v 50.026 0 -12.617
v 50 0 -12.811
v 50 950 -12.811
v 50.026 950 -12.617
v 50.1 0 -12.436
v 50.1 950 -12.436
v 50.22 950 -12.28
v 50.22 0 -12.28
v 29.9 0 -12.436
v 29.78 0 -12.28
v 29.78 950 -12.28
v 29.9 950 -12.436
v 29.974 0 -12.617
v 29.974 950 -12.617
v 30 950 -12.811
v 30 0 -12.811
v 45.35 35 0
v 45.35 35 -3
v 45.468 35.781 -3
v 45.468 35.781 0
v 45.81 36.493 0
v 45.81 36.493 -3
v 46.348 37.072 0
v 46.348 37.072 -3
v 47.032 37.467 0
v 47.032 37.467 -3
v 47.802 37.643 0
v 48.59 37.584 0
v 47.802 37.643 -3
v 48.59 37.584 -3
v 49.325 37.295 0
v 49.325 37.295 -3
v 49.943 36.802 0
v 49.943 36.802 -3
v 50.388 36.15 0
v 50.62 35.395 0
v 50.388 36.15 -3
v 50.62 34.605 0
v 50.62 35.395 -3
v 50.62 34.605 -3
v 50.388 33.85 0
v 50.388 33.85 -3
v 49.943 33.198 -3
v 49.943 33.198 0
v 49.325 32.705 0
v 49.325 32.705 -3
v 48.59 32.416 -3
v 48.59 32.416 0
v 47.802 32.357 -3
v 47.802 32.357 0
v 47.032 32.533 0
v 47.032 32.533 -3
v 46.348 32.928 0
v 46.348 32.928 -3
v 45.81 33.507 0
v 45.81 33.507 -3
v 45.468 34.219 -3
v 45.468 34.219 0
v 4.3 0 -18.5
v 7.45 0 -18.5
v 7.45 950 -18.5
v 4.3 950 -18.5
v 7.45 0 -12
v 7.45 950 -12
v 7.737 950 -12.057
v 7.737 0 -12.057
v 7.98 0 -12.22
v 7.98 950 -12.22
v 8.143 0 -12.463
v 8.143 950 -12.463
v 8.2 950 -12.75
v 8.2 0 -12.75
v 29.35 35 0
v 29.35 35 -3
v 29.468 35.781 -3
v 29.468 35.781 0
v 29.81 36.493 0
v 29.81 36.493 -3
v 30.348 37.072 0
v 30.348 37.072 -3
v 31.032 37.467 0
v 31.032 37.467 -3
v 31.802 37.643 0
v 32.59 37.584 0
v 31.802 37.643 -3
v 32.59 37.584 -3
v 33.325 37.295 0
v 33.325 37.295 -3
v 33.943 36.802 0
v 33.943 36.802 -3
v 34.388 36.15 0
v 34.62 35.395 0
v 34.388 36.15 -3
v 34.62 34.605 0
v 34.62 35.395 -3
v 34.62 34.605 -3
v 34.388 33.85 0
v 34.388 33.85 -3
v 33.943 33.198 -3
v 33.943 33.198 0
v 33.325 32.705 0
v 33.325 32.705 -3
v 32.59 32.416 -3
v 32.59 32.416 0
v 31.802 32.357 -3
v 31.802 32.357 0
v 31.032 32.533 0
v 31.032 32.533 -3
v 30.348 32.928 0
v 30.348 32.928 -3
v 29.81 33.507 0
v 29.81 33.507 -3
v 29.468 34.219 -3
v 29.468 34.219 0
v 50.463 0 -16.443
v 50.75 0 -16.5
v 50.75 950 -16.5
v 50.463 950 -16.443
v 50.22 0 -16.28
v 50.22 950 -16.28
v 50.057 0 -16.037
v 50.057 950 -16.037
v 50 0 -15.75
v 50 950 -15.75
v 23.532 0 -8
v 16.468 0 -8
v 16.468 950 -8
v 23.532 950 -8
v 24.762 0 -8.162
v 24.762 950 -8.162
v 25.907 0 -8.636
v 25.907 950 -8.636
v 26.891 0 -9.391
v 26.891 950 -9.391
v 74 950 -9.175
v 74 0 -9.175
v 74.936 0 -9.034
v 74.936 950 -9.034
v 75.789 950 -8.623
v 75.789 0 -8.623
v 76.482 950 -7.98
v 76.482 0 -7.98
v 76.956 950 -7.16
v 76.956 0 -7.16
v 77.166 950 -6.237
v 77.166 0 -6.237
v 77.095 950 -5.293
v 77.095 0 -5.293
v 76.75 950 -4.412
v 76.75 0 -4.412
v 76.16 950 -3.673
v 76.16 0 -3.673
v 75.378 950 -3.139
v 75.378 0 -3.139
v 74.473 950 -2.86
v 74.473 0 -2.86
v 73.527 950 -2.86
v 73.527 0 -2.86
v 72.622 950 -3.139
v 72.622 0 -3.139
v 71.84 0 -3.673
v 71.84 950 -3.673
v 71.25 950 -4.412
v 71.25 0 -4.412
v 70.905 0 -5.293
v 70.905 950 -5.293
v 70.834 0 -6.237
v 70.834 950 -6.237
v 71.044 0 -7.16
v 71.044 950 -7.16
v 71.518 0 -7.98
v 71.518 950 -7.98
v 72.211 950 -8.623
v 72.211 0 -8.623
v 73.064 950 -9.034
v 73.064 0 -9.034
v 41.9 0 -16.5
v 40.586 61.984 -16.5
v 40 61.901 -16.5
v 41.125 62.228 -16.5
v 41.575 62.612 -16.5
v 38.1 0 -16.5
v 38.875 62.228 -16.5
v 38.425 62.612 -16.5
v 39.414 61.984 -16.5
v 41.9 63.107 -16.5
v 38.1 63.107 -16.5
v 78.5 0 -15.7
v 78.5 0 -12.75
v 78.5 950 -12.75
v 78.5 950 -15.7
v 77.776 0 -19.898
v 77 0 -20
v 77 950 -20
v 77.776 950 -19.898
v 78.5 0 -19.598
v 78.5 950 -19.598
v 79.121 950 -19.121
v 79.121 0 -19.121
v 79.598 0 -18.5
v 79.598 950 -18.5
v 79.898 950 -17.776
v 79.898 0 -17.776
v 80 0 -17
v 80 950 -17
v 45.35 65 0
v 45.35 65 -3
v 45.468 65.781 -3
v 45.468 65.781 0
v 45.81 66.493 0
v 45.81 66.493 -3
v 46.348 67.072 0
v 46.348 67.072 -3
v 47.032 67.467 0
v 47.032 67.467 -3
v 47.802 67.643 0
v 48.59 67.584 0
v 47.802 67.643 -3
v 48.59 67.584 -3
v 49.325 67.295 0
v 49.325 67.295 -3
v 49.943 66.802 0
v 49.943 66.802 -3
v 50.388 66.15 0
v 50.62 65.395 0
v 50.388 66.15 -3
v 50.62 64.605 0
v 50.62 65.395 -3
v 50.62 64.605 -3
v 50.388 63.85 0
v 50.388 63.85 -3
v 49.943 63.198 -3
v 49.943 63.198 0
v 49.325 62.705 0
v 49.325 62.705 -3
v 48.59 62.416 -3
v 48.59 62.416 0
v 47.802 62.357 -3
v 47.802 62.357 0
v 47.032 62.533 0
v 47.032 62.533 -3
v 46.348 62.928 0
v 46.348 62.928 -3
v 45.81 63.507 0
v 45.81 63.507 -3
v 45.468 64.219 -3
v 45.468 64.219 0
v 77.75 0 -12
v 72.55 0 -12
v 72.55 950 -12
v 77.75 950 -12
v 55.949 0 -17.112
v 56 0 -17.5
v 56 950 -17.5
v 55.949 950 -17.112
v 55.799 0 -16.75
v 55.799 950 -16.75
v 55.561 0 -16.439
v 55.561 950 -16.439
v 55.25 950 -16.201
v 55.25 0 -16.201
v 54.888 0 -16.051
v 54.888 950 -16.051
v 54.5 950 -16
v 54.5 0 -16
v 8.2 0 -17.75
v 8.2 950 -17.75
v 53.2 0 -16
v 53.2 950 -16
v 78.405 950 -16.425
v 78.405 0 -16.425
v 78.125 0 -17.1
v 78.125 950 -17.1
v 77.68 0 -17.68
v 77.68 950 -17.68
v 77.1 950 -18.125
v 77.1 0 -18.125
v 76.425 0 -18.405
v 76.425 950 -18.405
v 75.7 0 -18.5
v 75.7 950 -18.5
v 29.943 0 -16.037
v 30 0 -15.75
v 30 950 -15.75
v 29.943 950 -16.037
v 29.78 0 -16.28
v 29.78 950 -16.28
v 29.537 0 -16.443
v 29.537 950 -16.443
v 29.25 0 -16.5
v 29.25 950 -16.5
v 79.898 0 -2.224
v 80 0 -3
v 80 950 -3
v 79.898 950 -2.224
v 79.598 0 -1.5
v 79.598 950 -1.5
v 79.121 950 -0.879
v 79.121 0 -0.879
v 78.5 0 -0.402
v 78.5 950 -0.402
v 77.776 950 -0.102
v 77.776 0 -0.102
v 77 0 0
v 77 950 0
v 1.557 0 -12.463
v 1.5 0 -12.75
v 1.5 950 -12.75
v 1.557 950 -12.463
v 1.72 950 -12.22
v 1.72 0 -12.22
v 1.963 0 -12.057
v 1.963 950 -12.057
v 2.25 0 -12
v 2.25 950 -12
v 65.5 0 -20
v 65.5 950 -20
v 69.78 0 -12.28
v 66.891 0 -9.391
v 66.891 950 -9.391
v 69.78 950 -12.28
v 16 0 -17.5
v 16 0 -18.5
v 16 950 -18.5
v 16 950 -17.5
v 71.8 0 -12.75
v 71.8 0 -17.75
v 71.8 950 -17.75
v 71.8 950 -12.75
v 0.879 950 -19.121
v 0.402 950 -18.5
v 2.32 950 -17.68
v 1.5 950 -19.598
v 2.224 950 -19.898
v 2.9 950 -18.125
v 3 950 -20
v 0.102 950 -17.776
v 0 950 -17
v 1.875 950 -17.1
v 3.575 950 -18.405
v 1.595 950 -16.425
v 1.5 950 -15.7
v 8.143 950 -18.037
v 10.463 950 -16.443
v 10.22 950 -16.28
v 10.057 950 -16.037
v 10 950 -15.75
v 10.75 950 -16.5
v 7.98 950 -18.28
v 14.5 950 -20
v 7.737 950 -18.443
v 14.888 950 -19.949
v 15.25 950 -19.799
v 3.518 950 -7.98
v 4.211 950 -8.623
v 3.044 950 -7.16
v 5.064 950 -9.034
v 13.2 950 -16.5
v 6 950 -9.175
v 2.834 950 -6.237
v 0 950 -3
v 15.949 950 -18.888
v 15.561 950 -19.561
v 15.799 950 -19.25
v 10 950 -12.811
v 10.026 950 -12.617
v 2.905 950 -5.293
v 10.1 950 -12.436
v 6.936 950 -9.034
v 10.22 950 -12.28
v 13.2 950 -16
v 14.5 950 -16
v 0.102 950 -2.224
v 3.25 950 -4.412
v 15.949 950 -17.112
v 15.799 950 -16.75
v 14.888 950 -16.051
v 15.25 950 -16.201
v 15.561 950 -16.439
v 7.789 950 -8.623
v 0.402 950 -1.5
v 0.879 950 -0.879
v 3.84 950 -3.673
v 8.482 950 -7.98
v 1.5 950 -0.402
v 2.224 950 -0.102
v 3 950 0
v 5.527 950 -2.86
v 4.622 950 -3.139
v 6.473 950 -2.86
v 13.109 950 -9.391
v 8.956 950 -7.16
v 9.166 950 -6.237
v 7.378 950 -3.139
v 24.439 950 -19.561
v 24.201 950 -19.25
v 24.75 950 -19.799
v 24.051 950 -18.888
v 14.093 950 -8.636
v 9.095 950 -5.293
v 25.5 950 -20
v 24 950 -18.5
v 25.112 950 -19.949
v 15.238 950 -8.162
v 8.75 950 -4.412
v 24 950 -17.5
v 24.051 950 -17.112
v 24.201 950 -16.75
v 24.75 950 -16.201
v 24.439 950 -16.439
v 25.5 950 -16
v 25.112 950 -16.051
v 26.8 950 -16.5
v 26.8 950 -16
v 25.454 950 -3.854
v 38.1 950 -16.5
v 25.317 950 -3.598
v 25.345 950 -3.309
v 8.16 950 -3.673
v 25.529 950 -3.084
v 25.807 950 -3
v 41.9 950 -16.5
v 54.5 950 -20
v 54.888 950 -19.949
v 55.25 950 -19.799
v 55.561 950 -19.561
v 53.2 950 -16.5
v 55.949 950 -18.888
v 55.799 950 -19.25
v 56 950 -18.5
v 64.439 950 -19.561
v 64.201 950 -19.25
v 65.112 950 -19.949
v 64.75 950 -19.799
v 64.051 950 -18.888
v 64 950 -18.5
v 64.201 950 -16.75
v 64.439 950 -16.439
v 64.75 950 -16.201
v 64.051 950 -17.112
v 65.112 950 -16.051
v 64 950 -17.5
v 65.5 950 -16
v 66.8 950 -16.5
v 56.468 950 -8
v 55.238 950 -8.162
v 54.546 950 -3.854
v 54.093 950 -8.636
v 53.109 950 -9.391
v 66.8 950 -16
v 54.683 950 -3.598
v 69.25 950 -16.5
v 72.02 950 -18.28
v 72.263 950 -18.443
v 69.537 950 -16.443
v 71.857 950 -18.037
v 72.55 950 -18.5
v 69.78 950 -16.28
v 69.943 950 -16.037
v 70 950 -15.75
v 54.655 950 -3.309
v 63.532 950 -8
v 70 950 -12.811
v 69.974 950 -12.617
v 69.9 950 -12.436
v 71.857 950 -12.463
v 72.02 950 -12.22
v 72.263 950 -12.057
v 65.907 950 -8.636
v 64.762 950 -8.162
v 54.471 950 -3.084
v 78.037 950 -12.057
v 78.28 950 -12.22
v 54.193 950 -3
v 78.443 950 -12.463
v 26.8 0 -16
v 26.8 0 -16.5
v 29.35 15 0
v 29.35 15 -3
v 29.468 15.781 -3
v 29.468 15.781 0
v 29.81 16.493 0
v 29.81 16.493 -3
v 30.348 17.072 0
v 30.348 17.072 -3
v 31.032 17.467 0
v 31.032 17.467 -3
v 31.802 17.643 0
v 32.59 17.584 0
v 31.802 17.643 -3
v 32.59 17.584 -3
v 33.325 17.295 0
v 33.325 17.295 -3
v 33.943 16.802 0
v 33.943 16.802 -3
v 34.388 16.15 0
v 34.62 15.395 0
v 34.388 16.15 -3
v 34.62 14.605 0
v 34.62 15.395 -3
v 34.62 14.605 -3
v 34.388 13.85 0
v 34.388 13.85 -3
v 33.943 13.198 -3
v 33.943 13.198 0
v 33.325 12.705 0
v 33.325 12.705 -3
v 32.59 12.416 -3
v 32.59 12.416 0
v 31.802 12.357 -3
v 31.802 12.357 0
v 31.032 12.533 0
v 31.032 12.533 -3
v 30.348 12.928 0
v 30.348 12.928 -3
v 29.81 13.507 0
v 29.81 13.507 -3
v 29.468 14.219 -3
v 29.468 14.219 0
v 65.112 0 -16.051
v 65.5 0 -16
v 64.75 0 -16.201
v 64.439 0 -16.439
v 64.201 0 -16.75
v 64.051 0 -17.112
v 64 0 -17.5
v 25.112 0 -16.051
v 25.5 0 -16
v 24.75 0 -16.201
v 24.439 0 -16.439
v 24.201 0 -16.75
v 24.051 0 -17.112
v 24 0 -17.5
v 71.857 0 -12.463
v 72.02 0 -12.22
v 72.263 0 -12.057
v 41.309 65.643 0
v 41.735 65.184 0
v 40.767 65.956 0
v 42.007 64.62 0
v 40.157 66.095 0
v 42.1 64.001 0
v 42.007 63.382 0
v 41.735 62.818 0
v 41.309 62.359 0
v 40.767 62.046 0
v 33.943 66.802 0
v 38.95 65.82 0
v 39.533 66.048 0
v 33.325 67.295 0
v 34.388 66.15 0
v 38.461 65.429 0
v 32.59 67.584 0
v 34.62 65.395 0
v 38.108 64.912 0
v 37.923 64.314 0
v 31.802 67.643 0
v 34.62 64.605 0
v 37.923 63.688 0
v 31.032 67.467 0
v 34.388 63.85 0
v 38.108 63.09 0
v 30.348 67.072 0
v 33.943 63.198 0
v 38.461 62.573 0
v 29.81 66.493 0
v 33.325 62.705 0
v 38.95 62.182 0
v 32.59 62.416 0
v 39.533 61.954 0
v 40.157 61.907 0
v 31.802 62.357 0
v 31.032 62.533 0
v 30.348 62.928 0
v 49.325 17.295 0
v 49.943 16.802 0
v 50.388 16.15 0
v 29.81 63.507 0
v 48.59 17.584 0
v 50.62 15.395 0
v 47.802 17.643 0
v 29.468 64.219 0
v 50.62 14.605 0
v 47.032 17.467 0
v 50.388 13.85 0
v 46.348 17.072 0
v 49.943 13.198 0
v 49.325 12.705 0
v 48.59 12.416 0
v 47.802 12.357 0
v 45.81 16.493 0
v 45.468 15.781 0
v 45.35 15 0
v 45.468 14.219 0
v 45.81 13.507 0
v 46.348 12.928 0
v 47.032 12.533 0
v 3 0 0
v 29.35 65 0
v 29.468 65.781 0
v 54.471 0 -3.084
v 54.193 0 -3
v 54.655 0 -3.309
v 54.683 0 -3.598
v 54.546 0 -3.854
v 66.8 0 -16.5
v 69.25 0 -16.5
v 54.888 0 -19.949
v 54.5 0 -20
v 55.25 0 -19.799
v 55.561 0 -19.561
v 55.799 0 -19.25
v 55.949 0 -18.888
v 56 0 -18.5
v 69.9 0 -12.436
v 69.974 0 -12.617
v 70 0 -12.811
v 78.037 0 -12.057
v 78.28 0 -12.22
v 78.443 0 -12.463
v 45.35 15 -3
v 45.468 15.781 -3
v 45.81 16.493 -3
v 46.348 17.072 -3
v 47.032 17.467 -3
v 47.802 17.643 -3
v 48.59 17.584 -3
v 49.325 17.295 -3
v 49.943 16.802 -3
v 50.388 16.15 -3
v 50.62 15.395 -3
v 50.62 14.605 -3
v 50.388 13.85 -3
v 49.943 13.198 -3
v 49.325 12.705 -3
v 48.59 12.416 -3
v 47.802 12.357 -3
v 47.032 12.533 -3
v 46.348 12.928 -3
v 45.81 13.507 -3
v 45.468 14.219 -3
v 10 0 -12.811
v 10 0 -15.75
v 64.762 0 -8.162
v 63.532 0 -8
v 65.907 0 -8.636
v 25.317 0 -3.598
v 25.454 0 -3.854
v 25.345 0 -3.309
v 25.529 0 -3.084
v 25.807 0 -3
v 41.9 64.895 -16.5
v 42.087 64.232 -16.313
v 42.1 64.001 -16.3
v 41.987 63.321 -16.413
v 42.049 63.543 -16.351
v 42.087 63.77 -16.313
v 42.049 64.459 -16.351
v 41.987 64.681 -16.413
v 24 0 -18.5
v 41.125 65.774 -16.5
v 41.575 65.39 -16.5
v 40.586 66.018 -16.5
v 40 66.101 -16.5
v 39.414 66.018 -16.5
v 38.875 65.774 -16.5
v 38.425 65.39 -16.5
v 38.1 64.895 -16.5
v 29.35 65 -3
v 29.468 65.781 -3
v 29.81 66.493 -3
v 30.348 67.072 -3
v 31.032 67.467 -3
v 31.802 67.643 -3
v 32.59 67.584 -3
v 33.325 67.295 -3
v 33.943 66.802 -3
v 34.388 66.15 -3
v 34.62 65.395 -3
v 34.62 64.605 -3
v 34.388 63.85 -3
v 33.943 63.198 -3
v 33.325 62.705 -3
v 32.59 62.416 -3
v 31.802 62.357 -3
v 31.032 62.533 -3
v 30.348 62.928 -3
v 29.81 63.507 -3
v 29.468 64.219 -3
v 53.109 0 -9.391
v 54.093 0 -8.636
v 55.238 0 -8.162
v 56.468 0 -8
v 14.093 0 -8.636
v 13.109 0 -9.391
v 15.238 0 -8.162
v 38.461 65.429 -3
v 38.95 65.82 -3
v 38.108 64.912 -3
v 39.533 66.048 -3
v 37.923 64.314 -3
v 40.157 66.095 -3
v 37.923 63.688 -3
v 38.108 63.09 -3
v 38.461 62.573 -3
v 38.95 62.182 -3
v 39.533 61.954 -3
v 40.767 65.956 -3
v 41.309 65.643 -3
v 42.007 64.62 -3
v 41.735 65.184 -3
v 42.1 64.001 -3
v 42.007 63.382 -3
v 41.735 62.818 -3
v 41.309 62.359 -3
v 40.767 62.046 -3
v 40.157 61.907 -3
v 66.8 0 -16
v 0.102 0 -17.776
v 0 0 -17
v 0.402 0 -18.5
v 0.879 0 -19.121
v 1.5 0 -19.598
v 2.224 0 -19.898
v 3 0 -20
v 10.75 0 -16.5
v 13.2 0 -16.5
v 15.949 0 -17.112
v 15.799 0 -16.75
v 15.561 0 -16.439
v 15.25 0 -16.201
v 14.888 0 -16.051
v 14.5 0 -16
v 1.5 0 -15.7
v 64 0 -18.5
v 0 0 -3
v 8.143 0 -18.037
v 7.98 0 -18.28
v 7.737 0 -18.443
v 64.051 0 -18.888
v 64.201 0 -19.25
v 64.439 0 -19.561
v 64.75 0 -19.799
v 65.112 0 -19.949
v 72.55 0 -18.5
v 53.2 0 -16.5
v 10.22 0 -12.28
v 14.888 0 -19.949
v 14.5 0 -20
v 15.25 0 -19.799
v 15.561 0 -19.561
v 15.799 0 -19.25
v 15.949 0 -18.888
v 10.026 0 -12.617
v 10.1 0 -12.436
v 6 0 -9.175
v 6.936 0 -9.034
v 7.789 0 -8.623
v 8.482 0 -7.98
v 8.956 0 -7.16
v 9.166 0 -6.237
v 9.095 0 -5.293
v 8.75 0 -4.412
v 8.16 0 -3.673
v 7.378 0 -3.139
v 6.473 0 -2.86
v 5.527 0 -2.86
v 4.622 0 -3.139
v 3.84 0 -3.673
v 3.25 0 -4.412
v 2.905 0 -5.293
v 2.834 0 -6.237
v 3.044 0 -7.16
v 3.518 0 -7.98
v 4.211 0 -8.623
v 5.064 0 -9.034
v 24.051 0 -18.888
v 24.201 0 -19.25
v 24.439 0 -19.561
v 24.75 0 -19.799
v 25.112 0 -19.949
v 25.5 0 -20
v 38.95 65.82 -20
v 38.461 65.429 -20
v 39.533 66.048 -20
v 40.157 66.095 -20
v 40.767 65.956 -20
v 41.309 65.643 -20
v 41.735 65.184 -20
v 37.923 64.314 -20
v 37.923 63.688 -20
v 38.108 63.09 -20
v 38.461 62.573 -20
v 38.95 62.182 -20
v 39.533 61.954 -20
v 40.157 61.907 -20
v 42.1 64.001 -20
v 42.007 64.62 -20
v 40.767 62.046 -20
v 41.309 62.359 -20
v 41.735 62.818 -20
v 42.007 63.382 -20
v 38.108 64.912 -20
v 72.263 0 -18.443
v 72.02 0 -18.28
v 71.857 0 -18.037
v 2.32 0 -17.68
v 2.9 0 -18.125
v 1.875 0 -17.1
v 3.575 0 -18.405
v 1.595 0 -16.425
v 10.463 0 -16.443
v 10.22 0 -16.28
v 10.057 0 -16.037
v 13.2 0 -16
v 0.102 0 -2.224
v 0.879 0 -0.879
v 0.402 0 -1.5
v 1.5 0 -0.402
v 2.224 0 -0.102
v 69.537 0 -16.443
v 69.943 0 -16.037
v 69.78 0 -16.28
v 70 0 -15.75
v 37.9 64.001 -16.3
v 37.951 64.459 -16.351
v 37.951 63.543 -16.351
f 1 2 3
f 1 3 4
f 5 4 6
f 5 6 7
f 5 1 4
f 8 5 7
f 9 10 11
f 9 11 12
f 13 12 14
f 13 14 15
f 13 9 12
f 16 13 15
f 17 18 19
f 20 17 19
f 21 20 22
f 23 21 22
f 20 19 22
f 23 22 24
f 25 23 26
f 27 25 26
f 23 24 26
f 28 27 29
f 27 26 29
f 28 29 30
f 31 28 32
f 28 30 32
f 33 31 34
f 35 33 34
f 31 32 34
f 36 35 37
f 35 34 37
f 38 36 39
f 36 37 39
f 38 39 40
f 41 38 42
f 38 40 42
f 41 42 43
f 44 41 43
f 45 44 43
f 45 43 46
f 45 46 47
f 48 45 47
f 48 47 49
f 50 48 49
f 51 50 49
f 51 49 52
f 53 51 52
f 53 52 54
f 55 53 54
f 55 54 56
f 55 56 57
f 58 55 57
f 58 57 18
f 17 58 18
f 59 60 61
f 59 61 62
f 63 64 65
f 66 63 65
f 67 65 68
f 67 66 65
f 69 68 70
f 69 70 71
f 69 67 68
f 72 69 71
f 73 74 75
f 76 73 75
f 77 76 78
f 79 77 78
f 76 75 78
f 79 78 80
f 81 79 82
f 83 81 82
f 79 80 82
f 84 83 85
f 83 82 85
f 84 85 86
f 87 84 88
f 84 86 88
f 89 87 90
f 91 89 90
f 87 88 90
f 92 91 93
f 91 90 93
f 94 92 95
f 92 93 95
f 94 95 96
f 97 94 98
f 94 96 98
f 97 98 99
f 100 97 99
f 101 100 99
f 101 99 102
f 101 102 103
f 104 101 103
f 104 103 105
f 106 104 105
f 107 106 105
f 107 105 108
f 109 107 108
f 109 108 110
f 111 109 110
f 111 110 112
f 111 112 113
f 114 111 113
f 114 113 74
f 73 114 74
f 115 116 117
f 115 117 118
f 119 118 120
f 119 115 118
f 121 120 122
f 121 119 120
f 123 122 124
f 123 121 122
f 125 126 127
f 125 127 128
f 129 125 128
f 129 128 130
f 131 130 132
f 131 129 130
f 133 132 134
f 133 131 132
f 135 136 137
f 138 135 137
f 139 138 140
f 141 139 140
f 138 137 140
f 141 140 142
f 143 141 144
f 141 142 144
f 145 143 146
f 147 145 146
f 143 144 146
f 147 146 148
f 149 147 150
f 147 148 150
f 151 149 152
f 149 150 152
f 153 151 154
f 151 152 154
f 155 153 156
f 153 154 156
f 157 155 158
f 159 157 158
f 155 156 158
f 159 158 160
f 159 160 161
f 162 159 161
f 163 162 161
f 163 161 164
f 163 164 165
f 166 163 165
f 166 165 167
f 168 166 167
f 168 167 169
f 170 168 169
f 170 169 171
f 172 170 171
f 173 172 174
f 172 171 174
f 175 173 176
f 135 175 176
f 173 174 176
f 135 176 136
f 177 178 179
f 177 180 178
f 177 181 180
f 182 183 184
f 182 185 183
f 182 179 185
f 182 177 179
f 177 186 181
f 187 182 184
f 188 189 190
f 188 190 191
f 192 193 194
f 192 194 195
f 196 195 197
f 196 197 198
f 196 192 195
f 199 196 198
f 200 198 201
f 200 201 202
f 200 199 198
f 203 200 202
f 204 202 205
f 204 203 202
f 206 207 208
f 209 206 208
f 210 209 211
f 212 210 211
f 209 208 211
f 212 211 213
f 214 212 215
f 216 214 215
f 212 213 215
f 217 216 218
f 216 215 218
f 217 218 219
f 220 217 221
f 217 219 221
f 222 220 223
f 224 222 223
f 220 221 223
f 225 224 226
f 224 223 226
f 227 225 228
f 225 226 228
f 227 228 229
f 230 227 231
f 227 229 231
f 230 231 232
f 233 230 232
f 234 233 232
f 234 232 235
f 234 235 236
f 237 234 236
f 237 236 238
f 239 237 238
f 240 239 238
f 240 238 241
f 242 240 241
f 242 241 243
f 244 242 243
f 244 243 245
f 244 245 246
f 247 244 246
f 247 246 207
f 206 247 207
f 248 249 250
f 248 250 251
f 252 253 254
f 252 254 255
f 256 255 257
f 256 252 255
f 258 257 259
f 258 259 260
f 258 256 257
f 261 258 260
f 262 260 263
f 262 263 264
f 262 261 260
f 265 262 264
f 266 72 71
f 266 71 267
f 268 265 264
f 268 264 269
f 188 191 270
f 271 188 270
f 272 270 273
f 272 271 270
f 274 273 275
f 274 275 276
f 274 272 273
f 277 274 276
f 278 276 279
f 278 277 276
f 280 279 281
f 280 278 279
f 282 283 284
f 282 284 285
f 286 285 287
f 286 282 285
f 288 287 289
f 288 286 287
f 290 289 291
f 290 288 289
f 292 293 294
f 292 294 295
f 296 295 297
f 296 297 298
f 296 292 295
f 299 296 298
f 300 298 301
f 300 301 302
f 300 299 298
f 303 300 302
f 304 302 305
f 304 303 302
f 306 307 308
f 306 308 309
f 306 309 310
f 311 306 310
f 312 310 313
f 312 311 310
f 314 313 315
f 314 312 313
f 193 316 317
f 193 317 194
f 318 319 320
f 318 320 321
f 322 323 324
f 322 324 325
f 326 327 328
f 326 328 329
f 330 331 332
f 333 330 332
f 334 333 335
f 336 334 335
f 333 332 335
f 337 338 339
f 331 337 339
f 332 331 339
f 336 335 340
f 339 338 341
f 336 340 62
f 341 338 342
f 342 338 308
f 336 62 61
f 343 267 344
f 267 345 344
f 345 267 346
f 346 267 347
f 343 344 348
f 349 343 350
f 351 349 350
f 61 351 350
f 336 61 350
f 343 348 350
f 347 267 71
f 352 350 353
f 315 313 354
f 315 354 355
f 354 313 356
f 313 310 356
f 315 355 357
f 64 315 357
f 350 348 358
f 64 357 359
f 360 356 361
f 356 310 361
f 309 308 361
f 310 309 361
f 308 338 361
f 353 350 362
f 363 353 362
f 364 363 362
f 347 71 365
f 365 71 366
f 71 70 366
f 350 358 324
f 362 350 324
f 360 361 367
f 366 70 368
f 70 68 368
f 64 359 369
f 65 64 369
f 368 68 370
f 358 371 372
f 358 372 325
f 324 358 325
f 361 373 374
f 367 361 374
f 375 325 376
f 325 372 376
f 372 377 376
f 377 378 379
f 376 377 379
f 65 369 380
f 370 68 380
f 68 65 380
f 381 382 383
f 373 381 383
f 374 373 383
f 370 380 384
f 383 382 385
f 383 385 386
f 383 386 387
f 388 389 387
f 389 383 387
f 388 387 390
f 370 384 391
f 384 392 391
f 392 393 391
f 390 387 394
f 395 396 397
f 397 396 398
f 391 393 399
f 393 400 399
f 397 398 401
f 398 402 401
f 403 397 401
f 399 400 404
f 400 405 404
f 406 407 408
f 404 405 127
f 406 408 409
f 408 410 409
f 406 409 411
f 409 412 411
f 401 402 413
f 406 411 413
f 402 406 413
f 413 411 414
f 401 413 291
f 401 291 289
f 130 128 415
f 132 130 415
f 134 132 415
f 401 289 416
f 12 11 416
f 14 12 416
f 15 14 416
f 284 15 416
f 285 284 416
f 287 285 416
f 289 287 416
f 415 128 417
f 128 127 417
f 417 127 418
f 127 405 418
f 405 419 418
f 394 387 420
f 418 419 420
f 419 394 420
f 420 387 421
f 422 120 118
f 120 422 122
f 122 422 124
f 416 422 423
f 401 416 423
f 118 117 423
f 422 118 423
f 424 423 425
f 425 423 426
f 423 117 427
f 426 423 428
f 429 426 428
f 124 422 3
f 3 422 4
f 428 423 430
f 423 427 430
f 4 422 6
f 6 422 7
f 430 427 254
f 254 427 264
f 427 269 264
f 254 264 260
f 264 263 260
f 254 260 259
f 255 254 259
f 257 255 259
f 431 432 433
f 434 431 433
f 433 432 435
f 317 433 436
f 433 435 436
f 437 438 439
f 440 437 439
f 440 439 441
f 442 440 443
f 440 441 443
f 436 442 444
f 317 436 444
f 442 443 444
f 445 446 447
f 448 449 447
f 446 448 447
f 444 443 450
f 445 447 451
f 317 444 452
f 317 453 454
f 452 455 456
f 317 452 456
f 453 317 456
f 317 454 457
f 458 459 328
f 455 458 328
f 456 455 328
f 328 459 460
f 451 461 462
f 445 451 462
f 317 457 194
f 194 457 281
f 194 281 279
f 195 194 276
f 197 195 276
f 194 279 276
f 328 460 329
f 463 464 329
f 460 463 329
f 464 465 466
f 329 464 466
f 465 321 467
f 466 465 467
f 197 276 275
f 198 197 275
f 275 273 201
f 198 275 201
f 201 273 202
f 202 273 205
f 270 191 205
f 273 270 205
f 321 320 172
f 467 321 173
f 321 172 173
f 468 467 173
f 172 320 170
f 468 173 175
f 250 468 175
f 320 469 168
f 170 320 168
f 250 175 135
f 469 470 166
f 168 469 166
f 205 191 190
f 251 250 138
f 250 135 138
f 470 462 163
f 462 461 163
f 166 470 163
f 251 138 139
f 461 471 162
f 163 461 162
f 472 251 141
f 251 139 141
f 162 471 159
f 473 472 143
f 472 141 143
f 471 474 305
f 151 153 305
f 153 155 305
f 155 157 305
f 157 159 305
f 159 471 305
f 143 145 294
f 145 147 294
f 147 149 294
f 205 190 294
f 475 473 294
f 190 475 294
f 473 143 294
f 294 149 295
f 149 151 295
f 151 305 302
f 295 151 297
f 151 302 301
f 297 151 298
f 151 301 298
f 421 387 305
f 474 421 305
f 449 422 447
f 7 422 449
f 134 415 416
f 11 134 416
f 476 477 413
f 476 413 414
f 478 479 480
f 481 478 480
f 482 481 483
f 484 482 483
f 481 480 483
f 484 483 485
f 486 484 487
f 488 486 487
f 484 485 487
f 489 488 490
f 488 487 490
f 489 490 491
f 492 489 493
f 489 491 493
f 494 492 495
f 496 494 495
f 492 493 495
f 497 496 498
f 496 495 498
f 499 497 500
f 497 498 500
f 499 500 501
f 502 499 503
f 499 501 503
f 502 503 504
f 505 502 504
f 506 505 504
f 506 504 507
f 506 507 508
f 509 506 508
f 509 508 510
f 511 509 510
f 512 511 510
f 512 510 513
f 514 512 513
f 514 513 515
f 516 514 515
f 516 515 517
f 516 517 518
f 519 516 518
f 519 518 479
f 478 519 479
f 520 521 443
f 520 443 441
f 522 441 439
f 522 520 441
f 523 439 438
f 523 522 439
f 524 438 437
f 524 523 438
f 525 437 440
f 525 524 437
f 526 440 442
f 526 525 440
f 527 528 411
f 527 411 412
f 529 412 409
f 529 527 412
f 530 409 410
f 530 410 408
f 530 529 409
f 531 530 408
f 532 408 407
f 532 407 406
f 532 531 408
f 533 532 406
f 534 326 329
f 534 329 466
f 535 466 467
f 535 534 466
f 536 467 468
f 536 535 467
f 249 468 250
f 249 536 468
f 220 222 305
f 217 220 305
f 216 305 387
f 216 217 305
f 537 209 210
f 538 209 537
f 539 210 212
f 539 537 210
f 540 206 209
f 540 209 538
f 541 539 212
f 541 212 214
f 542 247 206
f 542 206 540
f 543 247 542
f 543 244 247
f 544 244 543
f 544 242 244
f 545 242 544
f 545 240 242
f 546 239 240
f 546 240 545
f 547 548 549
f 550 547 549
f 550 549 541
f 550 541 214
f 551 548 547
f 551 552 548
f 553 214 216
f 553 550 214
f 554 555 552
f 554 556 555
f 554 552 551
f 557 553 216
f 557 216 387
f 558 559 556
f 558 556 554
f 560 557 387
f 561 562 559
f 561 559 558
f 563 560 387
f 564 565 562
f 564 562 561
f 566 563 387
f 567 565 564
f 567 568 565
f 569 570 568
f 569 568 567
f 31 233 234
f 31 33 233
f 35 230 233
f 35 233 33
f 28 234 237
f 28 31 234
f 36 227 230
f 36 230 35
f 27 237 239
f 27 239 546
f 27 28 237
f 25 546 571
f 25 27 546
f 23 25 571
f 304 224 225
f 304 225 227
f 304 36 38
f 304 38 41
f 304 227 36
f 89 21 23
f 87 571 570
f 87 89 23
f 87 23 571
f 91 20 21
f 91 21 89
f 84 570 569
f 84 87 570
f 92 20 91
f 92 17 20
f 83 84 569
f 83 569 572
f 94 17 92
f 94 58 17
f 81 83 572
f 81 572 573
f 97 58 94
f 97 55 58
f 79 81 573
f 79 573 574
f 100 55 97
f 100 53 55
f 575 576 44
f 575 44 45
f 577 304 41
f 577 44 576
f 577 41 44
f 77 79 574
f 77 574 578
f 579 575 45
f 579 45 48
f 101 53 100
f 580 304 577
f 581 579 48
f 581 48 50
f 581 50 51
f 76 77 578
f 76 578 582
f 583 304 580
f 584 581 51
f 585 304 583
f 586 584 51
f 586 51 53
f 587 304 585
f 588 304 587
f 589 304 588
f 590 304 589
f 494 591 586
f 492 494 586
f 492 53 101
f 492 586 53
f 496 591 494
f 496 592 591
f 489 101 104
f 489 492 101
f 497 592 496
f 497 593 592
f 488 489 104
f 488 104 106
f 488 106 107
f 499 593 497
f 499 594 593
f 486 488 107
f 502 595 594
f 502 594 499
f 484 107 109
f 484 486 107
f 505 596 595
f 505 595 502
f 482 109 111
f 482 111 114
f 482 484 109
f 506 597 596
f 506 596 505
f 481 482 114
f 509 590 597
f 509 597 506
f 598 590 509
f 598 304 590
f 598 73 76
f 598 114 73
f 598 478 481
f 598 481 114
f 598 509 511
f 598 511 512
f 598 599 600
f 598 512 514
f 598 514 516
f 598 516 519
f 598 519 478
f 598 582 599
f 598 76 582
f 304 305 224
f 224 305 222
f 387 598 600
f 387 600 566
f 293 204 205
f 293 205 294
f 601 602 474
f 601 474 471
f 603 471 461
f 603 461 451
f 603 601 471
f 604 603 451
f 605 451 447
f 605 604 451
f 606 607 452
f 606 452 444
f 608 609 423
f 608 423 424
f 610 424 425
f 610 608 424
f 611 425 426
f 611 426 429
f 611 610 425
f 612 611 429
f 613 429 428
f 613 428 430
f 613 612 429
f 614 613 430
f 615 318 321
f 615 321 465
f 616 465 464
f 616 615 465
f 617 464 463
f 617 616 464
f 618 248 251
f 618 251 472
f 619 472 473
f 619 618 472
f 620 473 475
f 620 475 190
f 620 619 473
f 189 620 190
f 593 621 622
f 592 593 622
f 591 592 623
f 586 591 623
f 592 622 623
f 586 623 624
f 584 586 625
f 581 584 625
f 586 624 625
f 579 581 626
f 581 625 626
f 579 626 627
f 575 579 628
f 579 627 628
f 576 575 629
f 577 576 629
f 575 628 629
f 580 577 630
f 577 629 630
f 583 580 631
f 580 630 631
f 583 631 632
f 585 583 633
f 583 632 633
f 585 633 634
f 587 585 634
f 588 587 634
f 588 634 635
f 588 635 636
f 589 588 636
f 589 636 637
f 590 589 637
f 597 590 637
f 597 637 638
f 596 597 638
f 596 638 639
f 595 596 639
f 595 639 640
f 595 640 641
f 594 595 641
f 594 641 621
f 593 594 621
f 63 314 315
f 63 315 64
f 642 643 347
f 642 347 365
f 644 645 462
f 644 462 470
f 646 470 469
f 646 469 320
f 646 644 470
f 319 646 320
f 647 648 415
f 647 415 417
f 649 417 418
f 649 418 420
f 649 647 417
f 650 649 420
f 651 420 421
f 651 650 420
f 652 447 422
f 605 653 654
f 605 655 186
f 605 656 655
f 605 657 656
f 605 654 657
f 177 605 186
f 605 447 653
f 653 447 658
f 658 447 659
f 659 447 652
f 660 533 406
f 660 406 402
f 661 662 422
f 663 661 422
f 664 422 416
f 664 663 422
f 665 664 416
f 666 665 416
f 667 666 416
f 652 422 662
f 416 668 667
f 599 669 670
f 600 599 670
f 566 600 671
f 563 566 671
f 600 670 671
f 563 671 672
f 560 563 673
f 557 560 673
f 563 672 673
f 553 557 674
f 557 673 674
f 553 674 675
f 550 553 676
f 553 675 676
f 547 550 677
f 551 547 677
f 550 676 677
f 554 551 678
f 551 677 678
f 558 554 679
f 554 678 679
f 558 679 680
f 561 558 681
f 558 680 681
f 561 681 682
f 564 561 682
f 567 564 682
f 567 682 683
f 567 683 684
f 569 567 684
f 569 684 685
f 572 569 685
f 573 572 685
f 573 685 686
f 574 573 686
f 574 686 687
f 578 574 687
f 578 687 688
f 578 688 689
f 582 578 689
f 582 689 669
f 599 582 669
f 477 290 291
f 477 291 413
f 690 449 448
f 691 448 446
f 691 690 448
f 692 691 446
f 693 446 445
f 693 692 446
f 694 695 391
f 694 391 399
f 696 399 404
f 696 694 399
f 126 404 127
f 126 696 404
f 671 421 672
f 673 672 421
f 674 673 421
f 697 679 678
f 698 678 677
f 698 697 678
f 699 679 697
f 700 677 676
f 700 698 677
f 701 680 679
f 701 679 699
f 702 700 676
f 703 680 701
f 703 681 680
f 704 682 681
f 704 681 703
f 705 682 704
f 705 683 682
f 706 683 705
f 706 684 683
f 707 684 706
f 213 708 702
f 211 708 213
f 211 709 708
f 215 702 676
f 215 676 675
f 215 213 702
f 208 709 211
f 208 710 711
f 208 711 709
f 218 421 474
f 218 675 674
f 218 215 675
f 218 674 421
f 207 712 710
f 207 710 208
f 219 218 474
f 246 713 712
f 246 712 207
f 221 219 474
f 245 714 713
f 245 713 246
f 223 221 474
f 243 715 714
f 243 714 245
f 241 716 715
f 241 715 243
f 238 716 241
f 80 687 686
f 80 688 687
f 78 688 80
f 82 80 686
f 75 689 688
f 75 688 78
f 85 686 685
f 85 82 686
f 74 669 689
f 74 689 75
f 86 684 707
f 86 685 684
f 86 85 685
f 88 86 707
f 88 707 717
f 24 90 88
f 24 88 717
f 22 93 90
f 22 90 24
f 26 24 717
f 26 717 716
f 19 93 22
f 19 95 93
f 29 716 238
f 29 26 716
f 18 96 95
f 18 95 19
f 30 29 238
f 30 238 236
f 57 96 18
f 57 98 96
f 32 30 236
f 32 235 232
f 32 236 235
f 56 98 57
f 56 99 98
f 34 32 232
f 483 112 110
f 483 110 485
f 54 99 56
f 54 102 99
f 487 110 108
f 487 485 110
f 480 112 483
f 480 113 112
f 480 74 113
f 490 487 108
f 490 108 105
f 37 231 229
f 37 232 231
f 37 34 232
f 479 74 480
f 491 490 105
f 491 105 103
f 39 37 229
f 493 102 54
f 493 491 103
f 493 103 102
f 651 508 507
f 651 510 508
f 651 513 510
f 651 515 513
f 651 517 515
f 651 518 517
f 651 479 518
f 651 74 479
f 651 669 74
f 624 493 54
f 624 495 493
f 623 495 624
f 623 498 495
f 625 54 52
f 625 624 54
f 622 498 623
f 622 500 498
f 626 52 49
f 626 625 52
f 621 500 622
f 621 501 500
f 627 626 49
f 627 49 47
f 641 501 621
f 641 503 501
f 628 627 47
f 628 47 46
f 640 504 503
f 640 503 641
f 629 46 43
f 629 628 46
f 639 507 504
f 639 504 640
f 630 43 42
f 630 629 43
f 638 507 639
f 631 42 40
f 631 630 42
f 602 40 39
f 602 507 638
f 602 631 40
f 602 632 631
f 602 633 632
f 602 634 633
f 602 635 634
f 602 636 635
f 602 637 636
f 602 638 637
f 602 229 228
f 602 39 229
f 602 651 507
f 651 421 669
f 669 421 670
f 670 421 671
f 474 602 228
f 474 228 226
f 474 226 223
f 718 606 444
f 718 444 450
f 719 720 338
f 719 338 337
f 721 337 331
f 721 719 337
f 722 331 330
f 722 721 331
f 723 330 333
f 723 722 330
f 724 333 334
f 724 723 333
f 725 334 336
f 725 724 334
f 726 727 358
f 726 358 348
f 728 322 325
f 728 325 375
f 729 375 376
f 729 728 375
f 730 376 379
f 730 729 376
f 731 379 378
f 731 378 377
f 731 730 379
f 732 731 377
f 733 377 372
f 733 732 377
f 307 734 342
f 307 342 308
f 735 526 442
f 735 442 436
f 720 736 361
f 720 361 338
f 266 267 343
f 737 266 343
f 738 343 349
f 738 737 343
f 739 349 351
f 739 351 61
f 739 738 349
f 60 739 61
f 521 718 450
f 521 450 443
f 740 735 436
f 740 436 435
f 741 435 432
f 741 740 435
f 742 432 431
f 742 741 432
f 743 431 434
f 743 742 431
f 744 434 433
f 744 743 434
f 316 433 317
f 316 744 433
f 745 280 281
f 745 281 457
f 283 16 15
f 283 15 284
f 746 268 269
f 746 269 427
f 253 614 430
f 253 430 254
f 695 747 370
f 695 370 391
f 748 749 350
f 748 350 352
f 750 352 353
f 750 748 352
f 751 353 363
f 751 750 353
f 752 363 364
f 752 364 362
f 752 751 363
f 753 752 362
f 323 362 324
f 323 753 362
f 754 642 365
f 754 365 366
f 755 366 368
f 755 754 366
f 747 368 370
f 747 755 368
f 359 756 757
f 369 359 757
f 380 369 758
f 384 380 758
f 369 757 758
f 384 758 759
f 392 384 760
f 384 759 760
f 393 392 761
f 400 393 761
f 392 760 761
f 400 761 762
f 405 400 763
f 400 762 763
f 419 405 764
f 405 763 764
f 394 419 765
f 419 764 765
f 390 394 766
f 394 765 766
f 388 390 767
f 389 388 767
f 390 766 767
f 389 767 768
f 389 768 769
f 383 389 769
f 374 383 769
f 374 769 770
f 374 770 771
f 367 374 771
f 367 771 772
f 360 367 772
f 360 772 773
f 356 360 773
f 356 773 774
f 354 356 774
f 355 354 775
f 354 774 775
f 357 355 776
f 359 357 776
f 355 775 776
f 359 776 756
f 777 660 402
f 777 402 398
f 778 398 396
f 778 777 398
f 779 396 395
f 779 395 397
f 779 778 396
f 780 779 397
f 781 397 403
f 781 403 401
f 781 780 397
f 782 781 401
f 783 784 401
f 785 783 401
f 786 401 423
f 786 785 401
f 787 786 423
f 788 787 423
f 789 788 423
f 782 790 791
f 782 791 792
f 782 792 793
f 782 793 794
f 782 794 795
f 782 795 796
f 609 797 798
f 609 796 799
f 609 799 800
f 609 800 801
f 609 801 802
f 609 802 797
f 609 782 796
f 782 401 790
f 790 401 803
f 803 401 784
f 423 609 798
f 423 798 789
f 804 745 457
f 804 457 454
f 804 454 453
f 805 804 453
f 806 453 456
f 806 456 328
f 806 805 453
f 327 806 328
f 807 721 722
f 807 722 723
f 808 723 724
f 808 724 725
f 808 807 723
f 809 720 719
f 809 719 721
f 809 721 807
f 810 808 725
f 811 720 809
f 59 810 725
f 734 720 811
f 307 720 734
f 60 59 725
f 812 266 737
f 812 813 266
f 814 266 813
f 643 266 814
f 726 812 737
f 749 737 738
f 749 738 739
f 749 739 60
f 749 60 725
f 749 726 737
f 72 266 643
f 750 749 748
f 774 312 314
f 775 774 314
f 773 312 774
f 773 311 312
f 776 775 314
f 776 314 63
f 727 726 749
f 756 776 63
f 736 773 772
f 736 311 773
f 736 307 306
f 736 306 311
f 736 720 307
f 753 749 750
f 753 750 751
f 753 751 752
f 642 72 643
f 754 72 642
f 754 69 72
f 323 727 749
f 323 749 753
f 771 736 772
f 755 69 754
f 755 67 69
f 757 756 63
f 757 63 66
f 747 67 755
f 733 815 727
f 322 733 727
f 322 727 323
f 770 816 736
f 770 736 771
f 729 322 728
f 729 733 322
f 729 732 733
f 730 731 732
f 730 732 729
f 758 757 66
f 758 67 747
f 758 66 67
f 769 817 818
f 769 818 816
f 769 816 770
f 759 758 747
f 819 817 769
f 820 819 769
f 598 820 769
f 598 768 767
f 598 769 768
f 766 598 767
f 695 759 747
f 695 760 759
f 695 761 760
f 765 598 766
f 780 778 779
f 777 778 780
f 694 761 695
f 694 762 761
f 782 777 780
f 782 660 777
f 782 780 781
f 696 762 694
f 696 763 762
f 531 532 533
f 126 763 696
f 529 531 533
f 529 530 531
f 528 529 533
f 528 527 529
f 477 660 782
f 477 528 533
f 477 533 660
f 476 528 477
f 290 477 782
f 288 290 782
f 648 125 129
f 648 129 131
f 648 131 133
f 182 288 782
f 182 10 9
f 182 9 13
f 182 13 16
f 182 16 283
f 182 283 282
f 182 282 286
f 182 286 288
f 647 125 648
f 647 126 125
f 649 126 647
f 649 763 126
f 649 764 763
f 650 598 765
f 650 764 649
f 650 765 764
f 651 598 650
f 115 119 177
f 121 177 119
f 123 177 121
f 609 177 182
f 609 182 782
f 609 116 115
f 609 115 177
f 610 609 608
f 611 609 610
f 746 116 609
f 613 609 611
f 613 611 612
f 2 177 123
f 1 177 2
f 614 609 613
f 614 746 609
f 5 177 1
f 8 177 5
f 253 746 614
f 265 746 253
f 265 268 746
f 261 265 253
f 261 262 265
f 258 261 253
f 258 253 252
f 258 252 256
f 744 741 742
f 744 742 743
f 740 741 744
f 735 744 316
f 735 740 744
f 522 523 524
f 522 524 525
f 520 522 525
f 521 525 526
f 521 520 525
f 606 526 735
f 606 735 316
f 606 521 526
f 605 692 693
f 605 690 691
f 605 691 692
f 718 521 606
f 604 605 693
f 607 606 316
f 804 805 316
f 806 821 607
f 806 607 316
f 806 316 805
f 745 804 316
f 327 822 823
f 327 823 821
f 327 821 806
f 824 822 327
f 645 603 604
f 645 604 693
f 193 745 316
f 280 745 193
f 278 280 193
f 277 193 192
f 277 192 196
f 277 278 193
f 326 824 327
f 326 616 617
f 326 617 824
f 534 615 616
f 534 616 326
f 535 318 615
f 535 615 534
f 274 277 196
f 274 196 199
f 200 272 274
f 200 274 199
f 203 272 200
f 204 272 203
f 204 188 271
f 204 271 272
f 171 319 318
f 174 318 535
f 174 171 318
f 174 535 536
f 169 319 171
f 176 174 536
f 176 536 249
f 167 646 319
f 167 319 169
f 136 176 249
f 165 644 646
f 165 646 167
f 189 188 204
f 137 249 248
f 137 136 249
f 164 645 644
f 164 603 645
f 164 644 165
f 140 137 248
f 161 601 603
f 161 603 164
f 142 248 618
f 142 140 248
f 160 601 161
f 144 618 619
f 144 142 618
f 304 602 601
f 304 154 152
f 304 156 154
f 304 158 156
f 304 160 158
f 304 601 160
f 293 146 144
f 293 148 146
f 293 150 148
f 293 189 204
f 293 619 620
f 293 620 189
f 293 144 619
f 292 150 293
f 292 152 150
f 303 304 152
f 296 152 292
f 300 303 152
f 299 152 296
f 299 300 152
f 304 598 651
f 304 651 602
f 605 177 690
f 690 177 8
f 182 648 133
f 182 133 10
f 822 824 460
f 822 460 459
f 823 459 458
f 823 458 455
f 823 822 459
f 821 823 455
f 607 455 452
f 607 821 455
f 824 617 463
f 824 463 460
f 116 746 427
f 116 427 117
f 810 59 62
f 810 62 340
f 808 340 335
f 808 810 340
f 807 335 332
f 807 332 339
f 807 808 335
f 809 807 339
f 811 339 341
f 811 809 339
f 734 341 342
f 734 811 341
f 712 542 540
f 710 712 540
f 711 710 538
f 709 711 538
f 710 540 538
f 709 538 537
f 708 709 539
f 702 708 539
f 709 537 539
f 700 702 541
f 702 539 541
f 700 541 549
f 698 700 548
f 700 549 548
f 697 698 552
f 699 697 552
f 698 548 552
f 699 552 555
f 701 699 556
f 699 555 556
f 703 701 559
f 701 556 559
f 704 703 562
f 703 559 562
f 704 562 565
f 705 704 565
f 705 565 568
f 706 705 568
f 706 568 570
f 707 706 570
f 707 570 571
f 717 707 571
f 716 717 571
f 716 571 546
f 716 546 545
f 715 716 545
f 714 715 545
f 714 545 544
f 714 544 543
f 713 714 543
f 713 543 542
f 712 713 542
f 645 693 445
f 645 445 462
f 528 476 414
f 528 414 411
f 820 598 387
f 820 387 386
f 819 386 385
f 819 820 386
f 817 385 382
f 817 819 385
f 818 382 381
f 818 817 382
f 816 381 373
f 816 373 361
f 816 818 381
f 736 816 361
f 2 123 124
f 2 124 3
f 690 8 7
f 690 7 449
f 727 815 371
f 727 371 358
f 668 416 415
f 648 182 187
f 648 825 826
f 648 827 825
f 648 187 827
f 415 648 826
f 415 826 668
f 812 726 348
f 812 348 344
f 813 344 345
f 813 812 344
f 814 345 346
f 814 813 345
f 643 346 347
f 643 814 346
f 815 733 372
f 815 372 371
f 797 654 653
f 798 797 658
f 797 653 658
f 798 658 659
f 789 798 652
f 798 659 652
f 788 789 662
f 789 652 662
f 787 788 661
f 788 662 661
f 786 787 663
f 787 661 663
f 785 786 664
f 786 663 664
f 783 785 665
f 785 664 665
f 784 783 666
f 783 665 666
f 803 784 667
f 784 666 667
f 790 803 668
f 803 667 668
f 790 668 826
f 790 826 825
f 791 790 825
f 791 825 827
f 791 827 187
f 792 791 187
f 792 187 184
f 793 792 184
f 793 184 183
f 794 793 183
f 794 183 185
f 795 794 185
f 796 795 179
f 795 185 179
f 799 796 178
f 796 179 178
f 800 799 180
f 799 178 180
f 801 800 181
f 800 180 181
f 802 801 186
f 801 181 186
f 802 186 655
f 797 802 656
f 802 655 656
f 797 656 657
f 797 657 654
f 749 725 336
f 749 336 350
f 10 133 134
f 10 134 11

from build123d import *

# Parameters (mm, degrees)
SKETCH1_R                = 3.175
BOSS_EXTRUDE1_DEPTH      = 950
M5_CLEARANCE_HOLE1_D     = 5.3
M5_CLEARANCE_HOLE1_DEPTH = 5
M5_CLEARANCE_HOLE1_TIP   = 1.59228064
M5X0_8_TAPPED_HOLE1_D    = 4.2


with BuildPart() as part:
    # Sketch1 → Boss-Extrude1 (new body)
    with BuildSketch(Plane.XZ):
        with BuildLine():
            Line((77, 0), (3, 0))
            ThreePointArc((3, 0), (0.878679656, -0.878679656), (0, -3))
            Line((0, -3), (0, -17))
            ThreePointArc((0, -17), (0.878679656, -19.121320344), (3, -20))
            Line((3, -20), (14.5, -20))
            ThreePointArc((14.5, -20), (15.560660172, -19.560660172), (16, -18.5))
            Line((16, -18.5), (16, -17.5))
            ThreePointArc((16, -17.5), (15.560660172, -16.439339828), (14.5, -16))
            Line((14.5, -16), (13.2, -16))
            Line((13.2, -16), (13.2, -16.5))
            Line((13.2, -16.5), (10.75, -16.5))
            ThreePointArc((10.75, -16.5), (10.219669914, -16.280330086), (10, -15.75))
            Line((10, -15.75), (10, -12.810660172))
            ThreePointArc((10, -12.810660172), (10.057090351, -12.523647598), (10.219669914, -12.280330086))
            Line((10.219669914, -12.280330086), (13.108757211, -9.391242789))
            ThreePointArc((13.108757211, -9.391242789), (14.649768118, -8.361572221), (16.467514421, -8))
            Line((16.467514421, -8), (23.532485579, -8))
            ThreePointArc((23.532485579, -8), (25.350231882, -8.361572221), (26.891242789, -9.391242789))
            Line((26.891242789, -9.391242789), (29.780330086, -12.280330086))
            ThreePointArc((29.780330086, -12.280330086), (29.942909649, -12.523647598), (30, -12.810660172))
            Line((30, -12.810660172), (30, -15.75))
            ThreePointArc((30, -15.75), (29.780330086, -16.280330086), (29.25, -16.5))
            Line((29.25, -16.5), (26.8, -16.5))
            Line((26.8, -16.5), (26.8, -16))
            Line((26.8, -16), (25.5, -16))
            ThreePointArc((25.5, -16), (24.439339828, -16.439339828), (24, -17.5))
            Line((24, -17.5), (24, -18.5))
            ThreePointArc((24, -18.5), (24.439339828, -19.560660172), (25.5, -20))
            Line((25.5, -20), (54.5, -20))
            ThreePointArc((54.5, -20), (55.560660172, -19.560660172), (56, -18.5))
            Line((56, -18.5), (56, -17.5))
            ThreePointArc((56, -17.5), (55.560660172, -16.439339828), (54.5, -16))
            Line((54.5, -16), (53.2, -16))
            Line((53.2, -16), (53.2, -16.5))
            Line((53.2, -16.5), (50.75, -16.5))
            ThreePointArc((50.75, -16.5), (50.219669914, -16.280330086), (50, -15.75))
            Line((50, -15.75), (50, -12.810660172))
            ThreePointArc((50, -12.810660172), (50.057090351, -12.523647598), (50.219669914, -12.280330086))
            Line((50.219669914, -12.280330086), (53.108757211, -9.391242789))
            ThreePointArc((53.108757211, -9.391242789), (54.649768118, -8.361572221), (56.467514421, -8))
            Line((56.467514421, -8), (63.532485579, -8))
            ThreePointArc((63.532485579, -8), (65.350231882, -8.361572221), (66.891242789, -9.391242789))
            Line((66.891242789, -9.391242789), (69.780330086, -12.280330086))
            ThreePointArc((69.780330086, -12.280330086), (69.942909649, -12.523647598), (70, -12.810660172))
            Line((70, -12.810660172), (70, -15.75))
            ThreePointArc((70, -15.75), (69.780330086, -16.280330086), (69.25, -16.5))
            Line((69.25, -16.5), (66.8, -16.5))
            Line((66.8, -16.5), (66.8, -16))
            Line((66.8, -16), (65.5, -16))
            ThreePointArc((65.5, -16), (64.439339828, -16.439339828), (64, -17.5))
            Line((64, -17.5), (64, -18.5))
            ThreePointArc((64, -18.5), (64.439339828, -19.560660172), (65.5, -20))
            Line((65.5, -20), (77, -20))
            ThreePointArc((77, -20), (79.121320344, -19.121320344), (80, -17))
            Line((80, -17), (80, -3))
            ThreePointArc((80, -3), (79.121320344, -0.878679656), (77, 0))
        make_face()
        with Locations(Location((6, -6, 0), (0, 0, 270))):
            Circle(SKETCH1_R, mode=Mode.SUBTRACT)
        with Locations(Location((74, -6, 0), (0, 0, 270))):
            Circle(SKETCH1_R, mode=Mode.SUBTRACT)
        with BuildLine():
            Line((7.45, -18.5), (4.3, -18.5))
            ThreePointArc((4.3, -18.5), (2.320101013, -17.679898987), (1.5, -15.7))
            Line((1.5, -15.7), (1.5, -12.75))
            ThreePointArc((1.5, -12.75), (1.719669914, -12.219669914), (2.25, -12))
            Line((2.25, -12), (7.45, -12))
            ThreePointArc((7.45, -12), (7.980330086, -12.219669914), (8.2, -12.75))
            Line((8.2, -12.75), (8.2, -17.75))
            ThreePointArc((8.2, -17.75), (7.980330086, -18.280330086), (7.45, -18.5))
        make_face(mode=Mode.SUBTRACT)
        with BuildLine():
            Line((54.546446609, -3.853553391), (41.9, -16.5))
            Line((41.9, -16.5), (38.1, -16.5))
            Line((38.1, -16.5), (25.453553391, -3.853553391))
            ThreePointArc((25.453553391, -3.853553391), (25.345167015, -3.308658284), (25.807106781, -3))
            Line((25.807106781, -3), (54.192893219, -3))
            ThreePointArc((54.192893219, -3), (54.654832985, -3.308658284), (54.546446609, -3.853553391))
        make_face(mode=Mode.SUBTRACT)
        with BuildLine():
            Line((71.8, -17.75), (71.8, -12.75))
            ThreePointArc((71.8, -12.75), (72.019669914, -12.219669914), (72.55, -12))
            Line((72.55, -12), (77.75, -12))
            ThreePointArc((77.75, -12), (78.280330086, -12.219669914), (78.5, -12.75))
            Line((78.5, -12.75), (78.5, -15.7))
            ThreePointArc((78.5, -15.7), (77.679898987, -17.679898987), (75.7, -18.5))
            Line((75.7, -18.5), (72.55, -18.5))
            ThreePointArc((72.55, -18.5), (72.019669914, -18.280330086), (71.8, -17.75))
        make_face(mode=Mode.SUBTRACT)
    extrude(amount=-BOSS_EXTRUDE1_DEPTH)

    # M5 Clearance Hole1
    with Locations(Plane.XY):
        with Locations((48, 15), (48, 35), (48, 65), (32, 65), (32, 35), (32, 15)):
            Hole(M5_CLEARANCE_HOLE1_D / 2, depth=M5_CLEARANCE_HOLE1_DEPTH)
            with Locations((0, 0, -(M5_CLEARANCE_HOLE1_DEPTH + M5_CLEARANCE_HOLE1_TIP / 2))):  # 118° drill point
                Cone(0, M5_CLEARANCE_HOLE1_D / 2, M5_CLEARANCE_HOLE1_TIP, mode=Mode.SUBTRACT)

    # M5x0.8 Tapped Hole1 (through all)
    with Locations(Plane(origin=(0, 0, -20), x_dir=(-1, 0, 0), z_dir=(0, 0, -1))):
        with Locations((-40, 64.001015899)):
            Hole(M5X0_8_TAPPED_HOLE1_D / 2)


solid = part.part
